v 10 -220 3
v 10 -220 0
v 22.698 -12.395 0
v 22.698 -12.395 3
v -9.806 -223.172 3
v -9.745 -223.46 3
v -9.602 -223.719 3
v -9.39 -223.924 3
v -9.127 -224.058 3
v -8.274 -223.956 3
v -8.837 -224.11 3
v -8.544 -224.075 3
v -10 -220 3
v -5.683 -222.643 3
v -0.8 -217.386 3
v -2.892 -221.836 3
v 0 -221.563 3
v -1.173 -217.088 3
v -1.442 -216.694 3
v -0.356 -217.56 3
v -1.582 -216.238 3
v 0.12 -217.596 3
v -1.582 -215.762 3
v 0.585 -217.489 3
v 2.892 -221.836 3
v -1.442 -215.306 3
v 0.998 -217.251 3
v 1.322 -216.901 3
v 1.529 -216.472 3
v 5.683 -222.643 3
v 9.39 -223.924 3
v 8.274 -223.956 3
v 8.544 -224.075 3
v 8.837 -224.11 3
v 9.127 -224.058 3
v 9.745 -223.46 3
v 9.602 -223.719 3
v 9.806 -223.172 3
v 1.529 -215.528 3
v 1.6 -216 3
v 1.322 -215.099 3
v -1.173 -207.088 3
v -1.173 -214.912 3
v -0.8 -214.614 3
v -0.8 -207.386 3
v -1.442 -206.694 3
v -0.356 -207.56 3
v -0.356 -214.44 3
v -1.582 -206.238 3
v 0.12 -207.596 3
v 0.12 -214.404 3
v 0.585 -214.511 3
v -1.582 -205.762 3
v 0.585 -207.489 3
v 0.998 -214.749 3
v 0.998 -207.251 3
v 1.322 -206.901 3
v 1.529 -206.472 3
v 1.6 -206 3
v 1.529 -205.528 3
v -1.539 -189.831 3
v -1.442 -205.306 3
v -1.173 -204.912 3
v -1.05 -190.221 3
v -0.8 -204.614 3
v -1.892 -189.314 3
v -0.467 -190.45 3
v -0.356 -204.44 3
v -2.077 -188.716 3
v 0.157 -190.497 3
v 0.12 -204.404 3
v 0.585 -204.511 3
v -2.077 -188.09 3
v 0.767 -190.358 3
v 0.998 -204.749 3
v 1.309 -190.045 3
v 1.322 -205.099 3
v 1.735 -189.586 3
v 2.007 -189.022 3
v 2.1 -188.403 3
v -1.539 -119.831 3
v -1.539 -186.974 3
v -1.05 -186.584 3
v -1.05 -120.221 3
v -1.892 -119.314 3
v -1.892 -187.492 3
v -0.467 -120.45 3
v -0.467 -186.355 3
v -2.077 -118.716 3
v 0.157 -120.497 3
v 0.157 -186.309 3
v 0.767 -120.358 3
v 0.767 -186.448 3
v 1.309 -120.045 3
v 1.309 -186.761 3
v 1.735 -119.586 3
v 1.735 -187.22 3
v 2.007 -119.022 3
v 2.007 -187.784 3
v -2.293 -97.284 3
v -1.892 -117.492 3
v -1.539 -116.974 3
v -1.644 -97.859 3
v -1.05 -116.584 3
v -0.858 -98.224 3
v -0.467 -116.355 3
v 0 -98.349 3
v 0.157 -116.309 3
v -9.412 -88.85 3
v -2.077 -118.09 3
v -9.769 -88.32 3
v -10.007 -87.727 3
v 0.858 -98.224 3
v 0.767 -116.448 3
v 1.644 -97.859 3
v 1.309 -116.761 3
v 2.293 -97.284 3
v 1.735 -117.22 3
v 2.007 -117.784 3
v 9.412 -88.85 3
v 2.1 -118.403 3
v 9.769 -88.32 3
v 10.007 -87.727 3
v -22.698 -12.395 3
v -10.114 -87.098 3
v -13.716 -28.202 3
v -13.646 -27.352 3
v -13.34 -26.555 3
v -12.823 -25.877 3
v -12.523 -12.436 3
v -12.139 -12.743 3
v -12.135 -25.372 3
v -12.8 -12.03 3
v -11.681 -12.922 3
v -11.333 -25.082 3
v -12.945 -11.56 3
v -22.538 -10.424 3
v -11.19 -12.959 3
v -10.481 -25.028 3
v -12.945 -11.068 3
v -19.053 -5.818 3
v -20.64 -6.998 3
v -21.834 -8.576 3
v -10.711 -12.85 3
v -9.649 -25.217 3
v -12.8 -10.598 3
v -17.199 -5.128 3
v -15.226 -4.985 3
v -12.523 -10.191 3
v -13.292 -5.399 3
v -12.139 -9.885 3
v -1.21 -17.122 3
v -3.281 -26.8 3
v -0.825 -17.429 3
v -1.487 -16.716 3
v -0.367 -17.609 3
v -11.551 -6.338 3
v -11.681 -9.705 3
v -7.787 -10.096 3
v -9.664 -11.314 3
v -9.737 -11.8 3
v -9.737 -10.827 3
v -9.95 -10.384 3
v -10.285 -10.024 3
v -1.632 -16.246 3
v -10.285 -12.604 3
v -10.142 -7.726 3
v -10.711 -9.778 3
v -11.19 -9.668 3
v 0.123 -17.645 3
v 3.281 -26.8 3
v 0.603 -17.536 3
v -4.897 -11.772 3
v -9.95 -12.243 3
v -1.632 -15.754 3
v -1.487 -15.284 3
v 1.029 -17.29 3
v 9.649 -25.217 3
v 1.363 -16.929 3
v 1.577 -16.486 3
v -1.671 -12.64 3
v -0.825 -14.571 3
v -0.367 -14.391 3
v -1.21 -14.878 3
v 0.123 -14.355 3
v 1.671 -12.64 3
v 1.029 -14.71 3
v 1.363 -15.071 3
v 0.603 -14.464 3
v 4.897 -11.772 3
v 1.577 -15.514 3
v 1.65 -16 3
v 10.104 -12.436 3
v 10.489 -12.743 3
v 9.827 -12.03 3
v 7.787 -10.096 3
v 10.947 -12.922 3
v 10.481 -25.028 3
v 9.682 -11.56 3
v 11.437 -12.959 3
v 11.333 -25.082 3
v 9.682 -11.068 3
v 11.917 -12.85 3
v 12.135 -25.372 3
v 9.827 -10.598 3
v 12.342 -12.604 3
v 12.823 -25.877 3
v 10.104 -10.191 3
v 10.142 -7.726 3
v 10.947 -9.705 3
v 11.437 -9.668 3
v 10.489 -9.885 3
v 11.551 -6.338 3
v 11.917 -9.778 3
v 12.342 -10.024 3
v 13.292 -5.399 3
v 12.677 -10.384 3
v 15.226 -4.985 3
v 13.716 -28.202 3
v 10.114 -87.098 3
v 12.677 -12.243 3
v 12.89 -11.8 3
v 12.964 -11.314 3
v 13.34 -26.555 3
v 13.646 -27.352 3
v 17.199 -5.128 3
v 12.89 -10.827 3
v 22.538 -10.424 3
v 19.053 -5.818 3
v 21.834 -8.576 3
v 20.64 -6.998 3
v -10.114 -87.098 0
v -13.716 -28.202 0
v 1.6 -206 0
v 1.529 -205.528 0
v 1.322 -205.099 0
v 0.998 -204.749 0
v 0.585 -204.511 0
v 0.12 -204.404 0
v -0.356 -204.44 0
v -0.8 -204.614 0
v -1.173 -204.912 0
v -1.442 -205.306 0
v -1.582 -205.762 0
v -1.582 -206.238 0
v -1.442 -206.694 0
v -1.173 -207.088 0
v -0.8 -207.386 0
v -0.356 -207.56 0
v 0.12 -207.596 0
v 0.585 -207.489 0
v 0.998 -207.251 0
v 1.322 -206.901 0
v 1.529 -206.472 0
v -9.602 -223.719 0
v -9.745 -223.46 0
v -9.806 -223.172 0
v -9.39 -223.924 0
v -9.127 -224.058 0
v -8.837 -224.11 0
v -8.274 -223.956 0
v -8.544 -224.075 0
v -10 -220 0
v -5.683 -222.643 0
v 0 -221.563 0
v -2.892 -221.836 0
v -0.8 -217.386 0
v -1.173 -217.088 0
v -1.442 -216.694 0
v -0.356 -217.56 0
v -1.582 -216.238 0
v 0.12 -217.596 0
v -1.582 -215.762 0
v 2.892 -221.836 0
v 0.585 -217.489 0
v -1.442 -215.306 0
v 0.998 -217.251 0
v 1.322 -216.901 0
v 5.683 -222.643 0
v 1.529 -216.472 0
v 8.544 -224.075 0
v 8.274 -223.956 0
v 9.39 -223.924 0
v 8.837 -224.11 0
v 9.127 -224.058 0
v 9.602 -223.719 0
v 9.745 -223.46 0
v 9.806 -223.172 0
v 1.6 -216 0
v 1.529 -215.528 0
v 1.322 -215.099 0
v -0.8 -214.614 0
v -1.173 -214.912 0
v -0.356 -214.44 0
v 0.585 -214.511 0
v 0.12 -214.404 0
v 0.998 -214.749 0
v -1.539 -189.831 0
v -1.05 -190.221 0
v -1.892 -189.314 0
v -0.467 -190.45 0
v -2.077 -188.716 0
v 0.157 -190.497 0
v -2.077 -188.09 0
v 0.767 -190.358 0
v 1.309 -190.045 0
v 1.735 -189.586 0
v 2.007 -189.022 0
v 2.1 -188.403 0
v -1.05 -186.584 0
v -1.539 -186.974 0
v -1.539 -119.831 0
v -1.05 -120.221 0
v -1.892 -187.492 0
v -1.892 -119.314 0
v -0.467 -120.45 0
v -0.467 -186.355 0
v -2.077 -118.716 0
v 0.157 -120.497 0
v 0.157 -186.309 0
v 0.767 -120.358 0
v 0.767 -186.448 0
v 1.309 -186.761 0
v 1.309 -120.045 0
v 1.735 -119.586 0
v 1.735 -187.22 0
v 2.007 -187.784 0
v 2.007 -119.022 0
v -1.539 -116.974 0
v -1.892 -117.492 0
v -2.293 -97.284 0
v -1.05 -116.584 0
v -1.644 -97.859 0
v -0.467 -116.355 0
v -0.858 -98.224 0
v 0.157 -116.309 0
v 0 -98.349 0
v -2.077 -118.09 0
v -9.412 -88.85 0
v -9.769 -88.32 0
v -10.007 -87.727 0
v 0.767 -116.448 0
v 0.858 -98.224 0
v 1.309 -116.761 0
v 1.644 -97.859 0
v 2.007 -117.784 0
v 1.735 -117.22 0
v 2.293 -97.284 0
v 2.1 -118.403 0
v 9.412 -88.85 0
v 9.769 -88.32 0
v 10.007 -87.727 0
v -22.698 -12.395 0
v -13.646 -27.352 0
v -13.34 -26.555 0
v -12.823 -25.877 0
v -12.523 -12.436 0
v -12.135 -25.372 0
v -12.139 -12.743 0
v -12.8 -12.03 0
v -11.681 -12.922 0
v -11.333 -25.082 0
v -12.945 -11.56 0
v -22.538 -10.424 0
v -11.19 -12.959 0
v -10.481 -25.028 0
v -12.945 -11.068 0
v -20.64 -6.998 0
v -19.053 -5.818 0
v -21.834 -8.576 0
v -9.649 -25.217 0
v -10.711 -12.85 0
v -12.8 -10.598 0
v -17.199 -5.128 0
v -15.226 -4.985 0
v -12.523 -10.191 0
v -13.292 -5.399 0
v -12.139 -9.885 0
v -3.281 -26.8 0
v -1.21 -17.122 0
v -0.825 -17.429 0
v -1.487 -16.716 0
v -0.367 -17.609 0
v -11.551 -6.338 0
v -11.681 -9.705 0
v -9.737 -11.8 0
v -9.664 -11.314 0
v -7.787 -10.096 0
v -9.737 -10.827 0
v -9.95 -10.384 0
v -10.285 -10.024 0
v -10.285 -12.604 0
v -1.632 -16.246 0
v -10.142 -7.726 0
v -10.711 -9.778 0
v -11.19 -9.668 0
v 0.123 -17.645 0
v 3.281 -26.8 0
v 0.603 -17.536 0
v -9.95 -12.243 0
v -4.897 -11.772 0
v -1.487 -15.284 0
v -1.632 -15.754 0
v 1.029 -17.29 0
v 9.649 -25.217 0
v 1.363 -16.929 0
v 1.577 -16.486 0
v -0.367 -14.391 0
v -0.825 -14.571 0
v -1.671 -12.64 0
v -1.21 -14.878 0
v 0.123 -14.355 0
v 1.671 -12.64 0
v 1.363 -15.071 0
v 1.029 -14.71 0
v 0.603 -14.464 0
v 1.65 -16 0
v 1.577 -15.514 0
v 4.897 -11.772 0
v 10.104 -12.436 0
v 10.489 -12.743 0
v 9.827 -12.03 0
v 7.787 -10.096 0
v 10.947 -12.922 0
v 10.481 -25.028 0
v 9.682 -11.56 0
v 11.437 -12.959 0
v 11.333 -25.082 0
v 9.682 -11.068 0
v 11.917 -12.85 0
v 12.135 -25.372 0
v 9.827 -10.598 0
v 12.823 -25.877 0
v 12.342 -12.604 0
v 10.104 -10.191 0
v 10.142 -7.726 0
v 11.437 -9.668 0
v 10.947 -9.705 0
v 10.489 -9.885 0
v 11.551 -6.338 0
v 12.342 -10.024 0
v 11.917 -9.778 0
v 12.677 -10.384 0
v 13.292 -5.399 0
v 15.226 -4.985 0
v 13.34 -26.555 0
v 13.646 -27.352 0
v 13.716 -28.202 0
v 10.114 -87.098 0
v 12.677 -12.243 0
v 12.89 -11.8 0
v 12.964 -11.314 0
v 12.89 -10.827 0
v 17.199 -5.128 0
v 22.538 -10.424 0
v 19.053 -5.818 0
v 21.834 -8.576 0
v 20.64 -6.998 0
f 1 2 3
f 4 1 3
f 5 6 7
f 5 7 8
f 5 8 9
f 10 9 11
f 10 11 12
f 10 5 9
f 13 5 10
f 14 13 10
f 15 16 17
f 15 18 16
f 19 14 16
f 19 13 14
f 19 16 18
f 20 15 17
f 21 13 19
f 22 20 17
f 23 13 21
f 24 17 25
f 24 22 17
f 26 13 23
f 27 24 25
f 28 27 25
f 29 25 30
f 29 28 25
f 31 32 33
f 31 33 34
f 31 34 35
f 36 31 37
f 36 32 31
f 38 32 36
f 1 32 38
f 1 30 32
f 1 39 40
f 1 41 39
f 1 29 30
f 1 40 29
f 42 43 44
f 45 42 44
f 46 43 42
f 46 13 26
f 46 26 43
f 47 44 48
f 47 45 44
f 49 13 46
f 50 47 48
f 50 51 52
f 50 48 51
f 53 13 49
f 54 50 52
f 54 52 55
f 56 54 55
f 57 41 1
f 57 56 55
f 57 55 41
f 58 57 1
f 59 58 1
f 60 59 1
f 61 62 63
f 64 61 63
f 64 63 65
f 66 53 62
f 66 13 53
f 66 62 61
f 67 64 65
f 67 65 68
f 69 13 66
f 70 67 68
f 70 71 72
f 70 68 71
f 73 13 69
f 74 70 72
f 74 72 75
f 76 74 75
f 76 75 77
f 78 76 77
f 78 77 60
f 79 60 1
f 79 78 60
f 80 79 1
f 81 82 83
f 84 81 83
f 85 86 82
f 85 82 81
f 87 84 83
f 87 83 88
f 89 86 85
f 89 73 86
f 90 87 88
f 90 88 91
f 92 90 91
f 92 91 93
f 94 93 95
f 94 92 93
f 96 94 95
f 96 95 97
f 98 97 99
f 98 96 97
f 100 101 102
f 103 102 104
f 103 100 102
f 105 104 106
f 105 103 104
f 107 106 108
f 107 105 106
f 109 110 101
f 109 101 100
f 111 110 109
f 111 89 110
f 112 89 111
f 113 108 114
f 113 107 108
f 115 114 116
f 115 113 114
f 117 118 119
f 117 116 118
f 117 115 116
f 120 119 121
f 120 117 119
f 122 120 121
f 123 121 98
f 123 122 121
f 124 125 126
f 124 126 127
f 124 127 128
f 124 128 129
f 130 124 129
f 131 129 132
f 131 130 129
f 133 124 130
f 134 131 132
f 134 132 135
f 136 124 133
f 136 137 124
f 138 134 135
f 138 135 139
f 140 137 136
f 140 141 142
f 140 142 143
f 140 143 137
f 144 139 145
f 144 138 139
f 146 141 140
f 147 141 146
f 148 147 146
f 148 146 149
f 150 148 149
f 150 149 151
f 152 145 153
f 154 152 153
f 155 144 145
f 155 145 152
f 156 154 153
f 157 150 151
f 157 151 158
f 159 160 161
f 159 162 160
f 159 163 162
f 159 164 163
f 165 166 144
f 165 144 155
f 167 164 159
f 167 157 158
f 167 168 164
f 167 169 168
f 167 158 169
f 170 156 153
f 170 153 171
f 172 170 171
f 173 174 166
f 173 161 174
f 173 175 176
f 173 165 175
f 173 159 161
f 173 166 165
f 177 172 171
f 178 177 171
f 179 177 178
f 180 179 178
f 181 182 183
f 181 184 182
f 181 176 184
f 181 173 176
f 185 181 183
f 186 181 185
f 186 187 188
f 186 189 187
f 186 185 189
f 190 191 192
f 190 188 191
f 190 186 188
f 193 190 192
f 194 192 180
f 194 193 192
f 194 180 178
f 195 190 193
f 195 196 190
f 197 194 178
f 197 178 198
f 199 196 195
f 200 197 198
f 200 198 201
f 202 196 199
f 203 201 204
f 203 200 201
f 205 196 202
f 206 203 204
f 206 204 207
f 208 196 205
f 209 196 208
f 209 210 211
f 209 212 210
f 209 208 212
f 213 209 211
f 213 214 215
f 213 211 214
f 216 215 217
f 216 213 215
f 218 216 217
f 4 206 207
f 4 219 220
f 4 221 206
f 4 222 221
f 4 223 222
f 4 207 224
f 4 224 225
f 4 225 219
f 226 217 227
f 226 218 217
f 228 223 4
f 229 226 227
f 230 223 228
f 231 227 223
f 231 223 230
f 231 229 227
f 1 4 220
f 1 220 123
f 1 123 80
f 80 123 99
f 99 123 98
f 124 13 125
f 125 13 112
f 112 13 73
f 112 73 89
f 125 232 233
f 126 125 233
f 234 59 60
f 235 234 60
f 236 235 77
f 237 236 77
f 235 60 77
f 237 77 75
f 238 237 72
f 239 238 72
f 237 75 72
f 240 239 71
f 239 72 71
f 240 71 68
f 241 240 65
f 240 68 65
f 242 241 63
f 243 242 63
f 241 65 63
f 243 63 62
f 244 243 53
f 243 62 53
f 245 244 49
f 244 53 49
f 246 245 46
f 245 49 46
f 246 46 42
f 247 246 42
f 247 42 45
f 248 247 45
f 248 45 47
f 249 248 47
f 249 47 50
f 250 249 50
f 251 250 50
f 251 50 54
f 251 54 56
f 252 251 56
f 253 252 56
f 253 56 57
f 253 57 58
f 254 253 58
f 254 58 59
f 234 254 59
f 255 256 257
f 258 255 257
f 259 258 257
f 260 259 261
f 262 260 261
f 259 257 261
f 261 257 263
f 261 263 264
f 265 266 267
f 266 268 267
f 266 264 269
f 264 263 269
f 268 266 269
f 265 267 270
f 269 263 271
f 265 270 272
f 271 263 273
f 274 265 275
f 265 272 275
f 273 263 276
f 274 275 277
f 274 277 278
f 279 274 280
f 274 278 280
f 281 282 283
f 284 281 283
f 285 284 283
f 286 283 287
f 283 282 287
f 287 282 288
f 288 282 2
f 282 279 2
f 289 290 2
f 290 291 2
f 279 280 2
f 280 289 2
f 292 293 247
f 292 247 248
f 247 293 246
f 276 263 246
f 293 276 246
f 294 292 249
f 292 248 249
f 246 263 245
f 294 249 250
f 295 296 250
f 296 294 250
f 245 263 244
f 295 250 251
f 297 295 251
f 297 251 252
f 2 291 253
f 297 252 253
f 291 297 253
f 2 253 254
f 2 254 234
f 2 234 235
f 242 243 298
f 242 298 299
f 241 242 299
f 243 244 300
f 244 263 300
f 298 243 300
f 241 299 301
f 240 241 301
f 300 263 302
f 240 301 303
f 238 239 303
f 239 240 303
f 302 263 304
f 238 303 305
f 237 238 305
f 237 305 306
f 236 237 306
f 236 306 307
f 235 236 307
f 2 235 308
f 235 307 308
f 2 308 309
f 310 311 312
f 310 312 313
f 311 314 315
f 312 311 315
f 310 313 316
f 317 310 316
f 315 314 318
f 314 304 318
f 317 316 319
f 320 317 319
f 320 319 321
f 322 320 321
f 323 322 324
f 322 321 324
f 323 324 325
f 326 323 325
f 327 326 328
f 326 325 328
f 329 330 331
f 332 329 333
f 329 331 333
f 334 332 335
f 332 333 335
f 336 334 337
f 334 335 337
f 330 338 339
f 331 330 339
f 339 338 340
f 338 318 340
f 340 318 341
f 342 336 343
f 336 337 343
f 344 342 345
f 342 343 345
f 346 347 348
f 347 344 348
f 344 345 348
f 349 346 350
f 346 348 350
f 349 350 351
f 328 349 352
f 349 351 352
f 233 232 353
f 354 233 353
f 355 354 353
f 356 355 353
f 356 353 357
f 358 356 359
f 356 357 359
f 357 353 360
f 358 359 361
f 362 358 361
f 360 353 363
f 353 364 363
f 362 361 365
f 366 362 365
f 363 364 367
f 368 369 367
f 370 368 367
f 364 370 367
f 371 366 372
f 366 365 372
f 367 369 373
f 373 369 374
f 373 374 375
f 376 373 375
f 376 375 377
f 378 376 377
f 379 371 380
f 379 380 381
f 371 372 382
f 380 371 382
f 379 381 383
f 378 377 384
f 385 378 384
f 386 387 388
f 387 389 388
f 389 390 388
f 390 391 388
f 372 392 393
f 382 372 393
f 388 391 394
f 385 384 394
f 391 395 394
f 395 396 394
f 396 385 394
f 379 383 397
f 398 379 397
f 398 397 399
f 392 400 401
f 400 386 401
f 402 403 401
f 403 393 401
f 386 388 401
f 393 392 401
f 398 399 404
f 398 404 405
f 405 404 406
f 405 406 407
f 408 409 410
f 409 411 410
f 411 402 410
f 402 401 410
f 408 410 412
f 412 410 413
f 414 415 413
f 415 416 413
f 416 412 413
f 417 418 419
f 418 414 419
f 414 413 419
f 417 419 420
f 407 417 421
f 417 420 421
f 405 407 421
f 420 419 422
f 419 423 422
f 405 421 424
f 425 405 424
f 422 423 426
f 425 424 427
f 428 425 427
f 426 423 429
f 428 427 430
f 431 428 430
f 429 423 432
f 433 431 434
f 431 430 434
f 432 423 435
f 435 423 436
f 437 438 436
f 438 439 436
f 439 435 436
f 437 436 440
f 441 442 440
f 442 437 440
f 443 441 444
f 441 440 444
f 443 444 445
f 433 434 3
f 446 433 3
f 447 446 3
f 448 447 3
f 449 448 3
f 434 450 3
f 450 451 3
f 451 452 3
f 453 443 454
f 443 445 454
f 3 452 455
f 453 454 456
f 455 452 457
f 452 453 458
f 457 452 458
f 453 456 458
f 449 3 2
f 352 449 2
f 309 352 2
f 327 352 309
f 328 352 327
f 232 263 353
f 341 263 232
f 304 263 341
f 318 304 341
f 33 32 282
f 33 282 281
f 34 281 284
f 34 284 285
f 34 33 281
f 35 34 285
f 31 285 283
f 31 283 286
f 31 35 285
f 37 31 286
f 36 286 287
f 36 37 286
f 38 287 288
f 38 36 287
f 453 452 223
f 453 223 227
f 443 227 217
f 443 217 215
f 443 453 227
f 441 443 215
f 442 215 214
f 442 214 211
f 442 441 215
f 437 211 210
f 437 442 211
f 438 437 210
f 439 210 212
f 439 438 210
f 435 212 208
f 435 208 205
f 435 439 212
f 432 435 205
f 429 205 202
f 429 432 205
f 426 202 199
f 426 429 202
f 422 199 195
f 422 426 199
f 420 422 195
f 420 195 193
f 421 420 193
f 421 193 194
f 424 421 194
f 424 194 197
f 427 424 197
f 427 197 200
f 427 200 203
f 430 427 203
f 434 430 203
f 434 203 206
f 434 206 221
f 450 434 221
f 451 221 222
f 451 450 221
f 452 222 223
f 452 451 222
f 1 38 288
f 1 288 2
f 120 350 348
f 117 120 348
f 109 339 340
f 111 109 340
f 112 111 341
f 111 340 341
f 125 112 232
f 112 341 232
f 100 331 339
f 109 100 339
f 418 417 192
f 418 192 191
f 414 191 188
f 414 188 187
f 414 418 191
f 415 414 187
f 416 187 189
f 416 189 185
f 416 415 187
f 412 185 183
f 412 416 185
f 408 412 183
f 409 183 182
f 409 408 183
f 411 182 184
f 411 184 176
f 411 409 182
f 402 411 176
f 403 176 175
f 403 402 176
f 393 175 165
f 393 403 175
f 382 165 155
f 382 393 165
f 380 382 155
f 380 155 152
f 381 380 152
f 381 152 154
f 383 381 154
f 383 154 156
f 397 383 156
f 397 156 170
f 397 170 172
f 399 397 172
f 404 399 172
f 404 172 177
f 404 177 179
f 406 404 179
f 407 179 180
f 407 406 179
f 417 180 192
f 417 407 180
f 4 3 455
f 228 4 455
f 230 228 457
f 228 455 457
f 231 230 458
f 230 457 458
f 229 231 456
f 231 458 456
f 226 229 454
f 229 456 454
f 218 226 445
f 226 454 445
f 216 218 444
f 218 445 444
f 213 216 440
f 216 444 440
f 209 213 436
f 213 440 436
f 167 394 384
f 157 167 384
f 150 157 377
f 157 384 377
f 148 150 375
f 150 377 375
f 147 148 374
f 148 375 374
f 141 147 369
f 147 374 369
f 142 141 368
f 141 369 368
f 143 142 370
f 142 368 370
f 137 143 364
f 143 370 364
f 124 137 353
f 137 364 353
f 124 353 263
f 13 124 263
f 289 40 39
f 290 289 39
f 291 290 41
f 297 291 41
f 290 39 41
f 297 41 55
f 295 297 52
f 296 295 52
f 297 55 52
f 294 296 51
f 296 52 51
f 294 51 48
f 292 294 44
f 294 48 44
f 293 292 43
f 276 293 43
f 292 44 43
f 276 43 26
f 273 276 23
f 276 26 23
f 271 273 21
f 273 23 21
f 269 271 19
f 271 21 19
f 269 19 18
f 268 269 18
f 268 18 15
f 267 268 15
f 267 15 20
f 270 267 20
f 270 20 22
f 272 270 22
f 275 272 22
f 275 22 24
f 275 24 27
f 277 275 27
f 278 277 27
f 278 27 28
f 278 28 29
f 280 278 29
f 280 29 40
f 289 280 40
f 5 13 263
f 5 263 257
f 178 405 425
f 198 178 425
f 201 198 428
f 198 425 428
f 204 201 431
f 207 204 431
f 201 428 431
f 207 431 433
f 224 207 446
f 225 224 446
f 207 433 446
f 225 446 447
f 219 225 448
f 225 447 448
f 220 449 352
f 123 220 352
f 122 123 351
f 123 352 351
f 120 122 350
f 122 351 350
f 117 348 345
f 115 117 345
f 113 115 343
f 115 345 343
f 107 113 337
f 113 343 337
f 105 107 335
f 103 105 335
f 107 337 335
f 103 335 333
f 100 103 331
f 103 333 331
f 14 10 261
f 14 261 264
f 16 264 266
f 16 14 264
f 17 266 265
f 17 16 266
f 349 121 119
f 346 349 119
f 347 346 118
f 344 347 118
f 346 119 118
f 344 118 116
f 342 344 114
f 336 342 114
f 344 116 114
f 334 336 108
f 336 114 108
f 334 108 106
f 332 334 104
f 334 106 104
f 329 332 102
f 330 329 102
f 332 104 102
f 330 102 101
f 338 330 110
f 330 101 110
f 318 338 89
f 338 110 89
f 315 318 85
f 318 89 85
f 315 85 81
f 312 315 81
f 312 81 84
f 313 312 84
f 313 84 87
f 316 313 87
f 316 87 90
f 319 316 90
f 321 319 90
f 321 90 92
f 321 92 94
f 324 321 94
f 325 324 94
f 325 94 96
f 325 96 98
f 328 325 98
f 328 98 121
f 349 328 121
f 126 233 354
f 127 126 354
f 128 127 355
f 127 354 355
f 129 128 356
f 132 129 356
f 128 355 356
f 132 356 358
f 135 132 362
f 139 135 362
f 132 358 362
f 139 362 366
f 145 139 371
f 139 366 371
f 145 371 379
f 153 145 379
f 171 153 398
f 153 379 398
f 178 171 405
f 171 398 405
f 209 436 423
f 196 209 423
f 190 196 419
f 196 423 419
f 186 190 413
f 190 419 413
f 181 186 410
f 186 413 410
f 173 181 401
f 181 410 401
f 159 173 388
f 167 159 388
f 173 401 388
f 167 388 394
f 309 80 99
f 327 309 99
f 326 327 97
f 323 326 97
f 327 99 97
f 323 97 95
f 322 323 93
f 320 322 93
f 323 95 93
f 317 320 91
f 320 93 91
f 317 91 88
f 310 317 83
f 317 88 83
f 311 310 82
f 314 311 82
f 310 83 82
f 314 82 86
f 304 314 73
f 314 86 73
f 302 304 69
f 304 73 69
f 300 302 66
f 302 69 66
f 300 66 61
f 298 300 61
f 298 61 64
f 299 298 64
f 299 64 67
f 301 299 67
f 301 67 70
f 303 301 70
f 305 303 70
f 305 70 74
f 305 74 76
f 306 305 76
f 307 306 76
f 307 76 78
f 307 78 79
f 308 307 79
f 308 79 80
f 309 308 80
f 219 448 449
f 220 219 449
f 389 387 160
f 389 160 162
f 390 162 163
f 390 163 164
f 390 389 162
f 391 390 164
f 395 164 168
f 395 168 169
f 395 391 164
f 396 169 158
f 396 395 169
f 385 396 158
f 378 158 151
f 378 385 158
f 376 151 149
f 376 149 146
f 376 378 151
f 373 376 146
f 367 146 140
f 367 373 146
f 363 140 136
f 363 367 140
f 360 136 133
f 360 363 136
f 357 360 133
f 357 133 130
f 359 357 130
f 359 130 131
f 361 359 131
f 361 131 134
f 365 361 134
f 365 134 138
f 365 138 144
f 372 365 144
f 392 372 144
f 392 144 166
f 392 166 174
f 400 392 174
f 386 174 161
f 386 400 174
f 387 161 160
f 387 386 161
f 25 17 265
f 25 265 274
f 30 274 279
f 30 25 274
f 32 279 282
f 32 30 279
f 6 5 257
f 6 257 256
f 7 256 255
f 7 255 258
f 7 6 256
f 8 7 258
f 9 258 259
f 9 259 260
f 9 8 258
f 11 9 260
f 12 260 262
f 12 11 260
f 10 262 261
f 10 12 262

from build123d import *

# Parameters (mm, degrees)
SKETCH_1_R          = 1.65
EXTRUDE_1_DEPTH     = 3
SKETCH_2_R          = 1.6
CUT_EXTRUDE_1_DEPTH = 15
CUT_EXTRUDE_2_DEPTH = 15
SKETCH_5_R          = 2.1
CUT_EXTRUDE_4_DEPTH = 10
EXTRUDE_2_DEPTH     = 3


with BuildPart() as part:
    # 草图1 → 凸台-拉伸1 (new body)
    with BuildSketch(Plane.XY):
        with BuildLine():
            Line((-10, -220), (10, -220))
            Line((10, -220), (22.697635701, -12.395491404))
            ThreePointArc((22.697635701, -12.395491404), (18.150671537, -5.407168438), (10.142345541, -7.726275101))
            ThreePointArc((10.142345541, -7.726275101), (0, -12.75), (-10.142345541, -7.726275101))
            ThreePointArc((-10.142345541, -7.726275101), (-18.150671537, -5.407168438), (-22.697635701, -12.395491404))
            Line((-22.697635701, -12.395491404), (-10, -220))
        make_face()
        with Locations((-11.313708499, -11.313708499)):
            Circle(SKETCH_1_R, mode=Mode.SUBTRACT)
        with Locations((0, -16)):
            Circle(SKETCH_1_R, mode=Mode.SUBTRACT)
        with Locations((11.313708499, -11.313708499)):
            Circle(SKETCH_1_R, mode=Mode.SUBTRACT)
    extrude(amount=EXTRUDE_1_DEPTH)

    # 草图2 → 切除-拉伸1 (cut)
    with BuildSketch(Plane.XY.offset(3)):
        with Locations((0, -216)):
            Circle(SKETCH_2_R)
        with Locations((0, -206)):
            Circle(SKETCH_2_R)
    extrude(amount=-CUT_EXTRUDE_1_DEPTH, mode=Mode.SUBTRACT)

    # 草图4 → 切除-拉伸2 (cut)
    with BuildSketch(Plane(origin=(0, 0, 0), x_dir=(-1, 0, 0), z_dir=(0, 0, -1))):
        with BuildLine():
            Line((-13.715926625, -28.201870805), (-10.113702702, -87.097711346))
            ThreePointArc((-10.113702702, -87.097711346), (-9.904103863, -88.030297779), (-9.411801117, -88.849618921))
            Line((-9.411801117, -88.849618921), (-2.292502811, -97.284018261))
            ThreePointArc((-2.292502811, -97.284018261), (0, -98.348965067), (2.292502811, -97.284018261))
            Line((2.292502811, -97.284018261), (9.411801117, -88.849618921))
            ThreePointArc((9.411801117, -88.849618921), (9.904103863, -88.030297779), (10.113702702, -87.097711346))
            Line((10.113702702, -87.097711346), (13.715926625, -28.201870805))
            ThreePointArc((13.715926625, -28.201870805), (12.496725506, -25.600326268), (9.649370007, -25.216852668))
            ThreePointArc((9.649370007, -25.216852668), (0, -27), (-9.649370007, -25.216852668))
            ThreePointArc((-9.649370007, -25.216852668), (-12.496725506, -25.600326268), (-13.715926625, -28.201870805))
        make_face()
    extrude(amount=-CUT_EXTRUDE_2_DEPTH, mode=Mode.SUBTRACT)

    # 草图5 → 切除-拉伸4 (cut)
    with BuildSketch(Plane.XY.offset(3)):
        with Locations((0, -188.402692504)):
            Circle(SKETCH_5_R)
        with Locations((0, -118.402692504)):
            Circle(SKETCH_5_R)
    extrude(amount=-CUT_EXTRUDE_4_DEPTH, mode=Mode.SUBTRACT)

    # 草图3 → 凸台-拉伸2 (add)
    with BuildSketch(Plane.XY.offset(3)):
        with BuildLine():
            Line((10, -220), (0, -220))
            Line((0, -220), (0, -221.563277065))
            ThreePointArc((0, -221.563277065), (4.306596315, -222.17357498), (8.274056276, -223.956408914))
            ThreePointArc((8.274056276, -223.956408914), (9.263696736, -224.000871181), (9.806001156, -223.171853056))
            Line((9.806001156, -223.171853056), (10, -220))
        make_face()
        with BuildLine():
            Line((0, -220), (-10, -220))
            Line((-10, -220), (-9.806001156, -223.171853056))
            ThreePointArc((-9.806001156, -223.171853056), (-9.263696736, -224.000871181), (-8.274056276, -223.956408914))
            ThreePointArc((-8.274056276, -223.956408914), (-4.306596315, -222.17357498), (0, -221.563277065))
            Line((0, -221.563277065), (0, -220))
        make_face()
    extrude(amount=-EXTRUDE_2_DEPTH)


solid = part.part
